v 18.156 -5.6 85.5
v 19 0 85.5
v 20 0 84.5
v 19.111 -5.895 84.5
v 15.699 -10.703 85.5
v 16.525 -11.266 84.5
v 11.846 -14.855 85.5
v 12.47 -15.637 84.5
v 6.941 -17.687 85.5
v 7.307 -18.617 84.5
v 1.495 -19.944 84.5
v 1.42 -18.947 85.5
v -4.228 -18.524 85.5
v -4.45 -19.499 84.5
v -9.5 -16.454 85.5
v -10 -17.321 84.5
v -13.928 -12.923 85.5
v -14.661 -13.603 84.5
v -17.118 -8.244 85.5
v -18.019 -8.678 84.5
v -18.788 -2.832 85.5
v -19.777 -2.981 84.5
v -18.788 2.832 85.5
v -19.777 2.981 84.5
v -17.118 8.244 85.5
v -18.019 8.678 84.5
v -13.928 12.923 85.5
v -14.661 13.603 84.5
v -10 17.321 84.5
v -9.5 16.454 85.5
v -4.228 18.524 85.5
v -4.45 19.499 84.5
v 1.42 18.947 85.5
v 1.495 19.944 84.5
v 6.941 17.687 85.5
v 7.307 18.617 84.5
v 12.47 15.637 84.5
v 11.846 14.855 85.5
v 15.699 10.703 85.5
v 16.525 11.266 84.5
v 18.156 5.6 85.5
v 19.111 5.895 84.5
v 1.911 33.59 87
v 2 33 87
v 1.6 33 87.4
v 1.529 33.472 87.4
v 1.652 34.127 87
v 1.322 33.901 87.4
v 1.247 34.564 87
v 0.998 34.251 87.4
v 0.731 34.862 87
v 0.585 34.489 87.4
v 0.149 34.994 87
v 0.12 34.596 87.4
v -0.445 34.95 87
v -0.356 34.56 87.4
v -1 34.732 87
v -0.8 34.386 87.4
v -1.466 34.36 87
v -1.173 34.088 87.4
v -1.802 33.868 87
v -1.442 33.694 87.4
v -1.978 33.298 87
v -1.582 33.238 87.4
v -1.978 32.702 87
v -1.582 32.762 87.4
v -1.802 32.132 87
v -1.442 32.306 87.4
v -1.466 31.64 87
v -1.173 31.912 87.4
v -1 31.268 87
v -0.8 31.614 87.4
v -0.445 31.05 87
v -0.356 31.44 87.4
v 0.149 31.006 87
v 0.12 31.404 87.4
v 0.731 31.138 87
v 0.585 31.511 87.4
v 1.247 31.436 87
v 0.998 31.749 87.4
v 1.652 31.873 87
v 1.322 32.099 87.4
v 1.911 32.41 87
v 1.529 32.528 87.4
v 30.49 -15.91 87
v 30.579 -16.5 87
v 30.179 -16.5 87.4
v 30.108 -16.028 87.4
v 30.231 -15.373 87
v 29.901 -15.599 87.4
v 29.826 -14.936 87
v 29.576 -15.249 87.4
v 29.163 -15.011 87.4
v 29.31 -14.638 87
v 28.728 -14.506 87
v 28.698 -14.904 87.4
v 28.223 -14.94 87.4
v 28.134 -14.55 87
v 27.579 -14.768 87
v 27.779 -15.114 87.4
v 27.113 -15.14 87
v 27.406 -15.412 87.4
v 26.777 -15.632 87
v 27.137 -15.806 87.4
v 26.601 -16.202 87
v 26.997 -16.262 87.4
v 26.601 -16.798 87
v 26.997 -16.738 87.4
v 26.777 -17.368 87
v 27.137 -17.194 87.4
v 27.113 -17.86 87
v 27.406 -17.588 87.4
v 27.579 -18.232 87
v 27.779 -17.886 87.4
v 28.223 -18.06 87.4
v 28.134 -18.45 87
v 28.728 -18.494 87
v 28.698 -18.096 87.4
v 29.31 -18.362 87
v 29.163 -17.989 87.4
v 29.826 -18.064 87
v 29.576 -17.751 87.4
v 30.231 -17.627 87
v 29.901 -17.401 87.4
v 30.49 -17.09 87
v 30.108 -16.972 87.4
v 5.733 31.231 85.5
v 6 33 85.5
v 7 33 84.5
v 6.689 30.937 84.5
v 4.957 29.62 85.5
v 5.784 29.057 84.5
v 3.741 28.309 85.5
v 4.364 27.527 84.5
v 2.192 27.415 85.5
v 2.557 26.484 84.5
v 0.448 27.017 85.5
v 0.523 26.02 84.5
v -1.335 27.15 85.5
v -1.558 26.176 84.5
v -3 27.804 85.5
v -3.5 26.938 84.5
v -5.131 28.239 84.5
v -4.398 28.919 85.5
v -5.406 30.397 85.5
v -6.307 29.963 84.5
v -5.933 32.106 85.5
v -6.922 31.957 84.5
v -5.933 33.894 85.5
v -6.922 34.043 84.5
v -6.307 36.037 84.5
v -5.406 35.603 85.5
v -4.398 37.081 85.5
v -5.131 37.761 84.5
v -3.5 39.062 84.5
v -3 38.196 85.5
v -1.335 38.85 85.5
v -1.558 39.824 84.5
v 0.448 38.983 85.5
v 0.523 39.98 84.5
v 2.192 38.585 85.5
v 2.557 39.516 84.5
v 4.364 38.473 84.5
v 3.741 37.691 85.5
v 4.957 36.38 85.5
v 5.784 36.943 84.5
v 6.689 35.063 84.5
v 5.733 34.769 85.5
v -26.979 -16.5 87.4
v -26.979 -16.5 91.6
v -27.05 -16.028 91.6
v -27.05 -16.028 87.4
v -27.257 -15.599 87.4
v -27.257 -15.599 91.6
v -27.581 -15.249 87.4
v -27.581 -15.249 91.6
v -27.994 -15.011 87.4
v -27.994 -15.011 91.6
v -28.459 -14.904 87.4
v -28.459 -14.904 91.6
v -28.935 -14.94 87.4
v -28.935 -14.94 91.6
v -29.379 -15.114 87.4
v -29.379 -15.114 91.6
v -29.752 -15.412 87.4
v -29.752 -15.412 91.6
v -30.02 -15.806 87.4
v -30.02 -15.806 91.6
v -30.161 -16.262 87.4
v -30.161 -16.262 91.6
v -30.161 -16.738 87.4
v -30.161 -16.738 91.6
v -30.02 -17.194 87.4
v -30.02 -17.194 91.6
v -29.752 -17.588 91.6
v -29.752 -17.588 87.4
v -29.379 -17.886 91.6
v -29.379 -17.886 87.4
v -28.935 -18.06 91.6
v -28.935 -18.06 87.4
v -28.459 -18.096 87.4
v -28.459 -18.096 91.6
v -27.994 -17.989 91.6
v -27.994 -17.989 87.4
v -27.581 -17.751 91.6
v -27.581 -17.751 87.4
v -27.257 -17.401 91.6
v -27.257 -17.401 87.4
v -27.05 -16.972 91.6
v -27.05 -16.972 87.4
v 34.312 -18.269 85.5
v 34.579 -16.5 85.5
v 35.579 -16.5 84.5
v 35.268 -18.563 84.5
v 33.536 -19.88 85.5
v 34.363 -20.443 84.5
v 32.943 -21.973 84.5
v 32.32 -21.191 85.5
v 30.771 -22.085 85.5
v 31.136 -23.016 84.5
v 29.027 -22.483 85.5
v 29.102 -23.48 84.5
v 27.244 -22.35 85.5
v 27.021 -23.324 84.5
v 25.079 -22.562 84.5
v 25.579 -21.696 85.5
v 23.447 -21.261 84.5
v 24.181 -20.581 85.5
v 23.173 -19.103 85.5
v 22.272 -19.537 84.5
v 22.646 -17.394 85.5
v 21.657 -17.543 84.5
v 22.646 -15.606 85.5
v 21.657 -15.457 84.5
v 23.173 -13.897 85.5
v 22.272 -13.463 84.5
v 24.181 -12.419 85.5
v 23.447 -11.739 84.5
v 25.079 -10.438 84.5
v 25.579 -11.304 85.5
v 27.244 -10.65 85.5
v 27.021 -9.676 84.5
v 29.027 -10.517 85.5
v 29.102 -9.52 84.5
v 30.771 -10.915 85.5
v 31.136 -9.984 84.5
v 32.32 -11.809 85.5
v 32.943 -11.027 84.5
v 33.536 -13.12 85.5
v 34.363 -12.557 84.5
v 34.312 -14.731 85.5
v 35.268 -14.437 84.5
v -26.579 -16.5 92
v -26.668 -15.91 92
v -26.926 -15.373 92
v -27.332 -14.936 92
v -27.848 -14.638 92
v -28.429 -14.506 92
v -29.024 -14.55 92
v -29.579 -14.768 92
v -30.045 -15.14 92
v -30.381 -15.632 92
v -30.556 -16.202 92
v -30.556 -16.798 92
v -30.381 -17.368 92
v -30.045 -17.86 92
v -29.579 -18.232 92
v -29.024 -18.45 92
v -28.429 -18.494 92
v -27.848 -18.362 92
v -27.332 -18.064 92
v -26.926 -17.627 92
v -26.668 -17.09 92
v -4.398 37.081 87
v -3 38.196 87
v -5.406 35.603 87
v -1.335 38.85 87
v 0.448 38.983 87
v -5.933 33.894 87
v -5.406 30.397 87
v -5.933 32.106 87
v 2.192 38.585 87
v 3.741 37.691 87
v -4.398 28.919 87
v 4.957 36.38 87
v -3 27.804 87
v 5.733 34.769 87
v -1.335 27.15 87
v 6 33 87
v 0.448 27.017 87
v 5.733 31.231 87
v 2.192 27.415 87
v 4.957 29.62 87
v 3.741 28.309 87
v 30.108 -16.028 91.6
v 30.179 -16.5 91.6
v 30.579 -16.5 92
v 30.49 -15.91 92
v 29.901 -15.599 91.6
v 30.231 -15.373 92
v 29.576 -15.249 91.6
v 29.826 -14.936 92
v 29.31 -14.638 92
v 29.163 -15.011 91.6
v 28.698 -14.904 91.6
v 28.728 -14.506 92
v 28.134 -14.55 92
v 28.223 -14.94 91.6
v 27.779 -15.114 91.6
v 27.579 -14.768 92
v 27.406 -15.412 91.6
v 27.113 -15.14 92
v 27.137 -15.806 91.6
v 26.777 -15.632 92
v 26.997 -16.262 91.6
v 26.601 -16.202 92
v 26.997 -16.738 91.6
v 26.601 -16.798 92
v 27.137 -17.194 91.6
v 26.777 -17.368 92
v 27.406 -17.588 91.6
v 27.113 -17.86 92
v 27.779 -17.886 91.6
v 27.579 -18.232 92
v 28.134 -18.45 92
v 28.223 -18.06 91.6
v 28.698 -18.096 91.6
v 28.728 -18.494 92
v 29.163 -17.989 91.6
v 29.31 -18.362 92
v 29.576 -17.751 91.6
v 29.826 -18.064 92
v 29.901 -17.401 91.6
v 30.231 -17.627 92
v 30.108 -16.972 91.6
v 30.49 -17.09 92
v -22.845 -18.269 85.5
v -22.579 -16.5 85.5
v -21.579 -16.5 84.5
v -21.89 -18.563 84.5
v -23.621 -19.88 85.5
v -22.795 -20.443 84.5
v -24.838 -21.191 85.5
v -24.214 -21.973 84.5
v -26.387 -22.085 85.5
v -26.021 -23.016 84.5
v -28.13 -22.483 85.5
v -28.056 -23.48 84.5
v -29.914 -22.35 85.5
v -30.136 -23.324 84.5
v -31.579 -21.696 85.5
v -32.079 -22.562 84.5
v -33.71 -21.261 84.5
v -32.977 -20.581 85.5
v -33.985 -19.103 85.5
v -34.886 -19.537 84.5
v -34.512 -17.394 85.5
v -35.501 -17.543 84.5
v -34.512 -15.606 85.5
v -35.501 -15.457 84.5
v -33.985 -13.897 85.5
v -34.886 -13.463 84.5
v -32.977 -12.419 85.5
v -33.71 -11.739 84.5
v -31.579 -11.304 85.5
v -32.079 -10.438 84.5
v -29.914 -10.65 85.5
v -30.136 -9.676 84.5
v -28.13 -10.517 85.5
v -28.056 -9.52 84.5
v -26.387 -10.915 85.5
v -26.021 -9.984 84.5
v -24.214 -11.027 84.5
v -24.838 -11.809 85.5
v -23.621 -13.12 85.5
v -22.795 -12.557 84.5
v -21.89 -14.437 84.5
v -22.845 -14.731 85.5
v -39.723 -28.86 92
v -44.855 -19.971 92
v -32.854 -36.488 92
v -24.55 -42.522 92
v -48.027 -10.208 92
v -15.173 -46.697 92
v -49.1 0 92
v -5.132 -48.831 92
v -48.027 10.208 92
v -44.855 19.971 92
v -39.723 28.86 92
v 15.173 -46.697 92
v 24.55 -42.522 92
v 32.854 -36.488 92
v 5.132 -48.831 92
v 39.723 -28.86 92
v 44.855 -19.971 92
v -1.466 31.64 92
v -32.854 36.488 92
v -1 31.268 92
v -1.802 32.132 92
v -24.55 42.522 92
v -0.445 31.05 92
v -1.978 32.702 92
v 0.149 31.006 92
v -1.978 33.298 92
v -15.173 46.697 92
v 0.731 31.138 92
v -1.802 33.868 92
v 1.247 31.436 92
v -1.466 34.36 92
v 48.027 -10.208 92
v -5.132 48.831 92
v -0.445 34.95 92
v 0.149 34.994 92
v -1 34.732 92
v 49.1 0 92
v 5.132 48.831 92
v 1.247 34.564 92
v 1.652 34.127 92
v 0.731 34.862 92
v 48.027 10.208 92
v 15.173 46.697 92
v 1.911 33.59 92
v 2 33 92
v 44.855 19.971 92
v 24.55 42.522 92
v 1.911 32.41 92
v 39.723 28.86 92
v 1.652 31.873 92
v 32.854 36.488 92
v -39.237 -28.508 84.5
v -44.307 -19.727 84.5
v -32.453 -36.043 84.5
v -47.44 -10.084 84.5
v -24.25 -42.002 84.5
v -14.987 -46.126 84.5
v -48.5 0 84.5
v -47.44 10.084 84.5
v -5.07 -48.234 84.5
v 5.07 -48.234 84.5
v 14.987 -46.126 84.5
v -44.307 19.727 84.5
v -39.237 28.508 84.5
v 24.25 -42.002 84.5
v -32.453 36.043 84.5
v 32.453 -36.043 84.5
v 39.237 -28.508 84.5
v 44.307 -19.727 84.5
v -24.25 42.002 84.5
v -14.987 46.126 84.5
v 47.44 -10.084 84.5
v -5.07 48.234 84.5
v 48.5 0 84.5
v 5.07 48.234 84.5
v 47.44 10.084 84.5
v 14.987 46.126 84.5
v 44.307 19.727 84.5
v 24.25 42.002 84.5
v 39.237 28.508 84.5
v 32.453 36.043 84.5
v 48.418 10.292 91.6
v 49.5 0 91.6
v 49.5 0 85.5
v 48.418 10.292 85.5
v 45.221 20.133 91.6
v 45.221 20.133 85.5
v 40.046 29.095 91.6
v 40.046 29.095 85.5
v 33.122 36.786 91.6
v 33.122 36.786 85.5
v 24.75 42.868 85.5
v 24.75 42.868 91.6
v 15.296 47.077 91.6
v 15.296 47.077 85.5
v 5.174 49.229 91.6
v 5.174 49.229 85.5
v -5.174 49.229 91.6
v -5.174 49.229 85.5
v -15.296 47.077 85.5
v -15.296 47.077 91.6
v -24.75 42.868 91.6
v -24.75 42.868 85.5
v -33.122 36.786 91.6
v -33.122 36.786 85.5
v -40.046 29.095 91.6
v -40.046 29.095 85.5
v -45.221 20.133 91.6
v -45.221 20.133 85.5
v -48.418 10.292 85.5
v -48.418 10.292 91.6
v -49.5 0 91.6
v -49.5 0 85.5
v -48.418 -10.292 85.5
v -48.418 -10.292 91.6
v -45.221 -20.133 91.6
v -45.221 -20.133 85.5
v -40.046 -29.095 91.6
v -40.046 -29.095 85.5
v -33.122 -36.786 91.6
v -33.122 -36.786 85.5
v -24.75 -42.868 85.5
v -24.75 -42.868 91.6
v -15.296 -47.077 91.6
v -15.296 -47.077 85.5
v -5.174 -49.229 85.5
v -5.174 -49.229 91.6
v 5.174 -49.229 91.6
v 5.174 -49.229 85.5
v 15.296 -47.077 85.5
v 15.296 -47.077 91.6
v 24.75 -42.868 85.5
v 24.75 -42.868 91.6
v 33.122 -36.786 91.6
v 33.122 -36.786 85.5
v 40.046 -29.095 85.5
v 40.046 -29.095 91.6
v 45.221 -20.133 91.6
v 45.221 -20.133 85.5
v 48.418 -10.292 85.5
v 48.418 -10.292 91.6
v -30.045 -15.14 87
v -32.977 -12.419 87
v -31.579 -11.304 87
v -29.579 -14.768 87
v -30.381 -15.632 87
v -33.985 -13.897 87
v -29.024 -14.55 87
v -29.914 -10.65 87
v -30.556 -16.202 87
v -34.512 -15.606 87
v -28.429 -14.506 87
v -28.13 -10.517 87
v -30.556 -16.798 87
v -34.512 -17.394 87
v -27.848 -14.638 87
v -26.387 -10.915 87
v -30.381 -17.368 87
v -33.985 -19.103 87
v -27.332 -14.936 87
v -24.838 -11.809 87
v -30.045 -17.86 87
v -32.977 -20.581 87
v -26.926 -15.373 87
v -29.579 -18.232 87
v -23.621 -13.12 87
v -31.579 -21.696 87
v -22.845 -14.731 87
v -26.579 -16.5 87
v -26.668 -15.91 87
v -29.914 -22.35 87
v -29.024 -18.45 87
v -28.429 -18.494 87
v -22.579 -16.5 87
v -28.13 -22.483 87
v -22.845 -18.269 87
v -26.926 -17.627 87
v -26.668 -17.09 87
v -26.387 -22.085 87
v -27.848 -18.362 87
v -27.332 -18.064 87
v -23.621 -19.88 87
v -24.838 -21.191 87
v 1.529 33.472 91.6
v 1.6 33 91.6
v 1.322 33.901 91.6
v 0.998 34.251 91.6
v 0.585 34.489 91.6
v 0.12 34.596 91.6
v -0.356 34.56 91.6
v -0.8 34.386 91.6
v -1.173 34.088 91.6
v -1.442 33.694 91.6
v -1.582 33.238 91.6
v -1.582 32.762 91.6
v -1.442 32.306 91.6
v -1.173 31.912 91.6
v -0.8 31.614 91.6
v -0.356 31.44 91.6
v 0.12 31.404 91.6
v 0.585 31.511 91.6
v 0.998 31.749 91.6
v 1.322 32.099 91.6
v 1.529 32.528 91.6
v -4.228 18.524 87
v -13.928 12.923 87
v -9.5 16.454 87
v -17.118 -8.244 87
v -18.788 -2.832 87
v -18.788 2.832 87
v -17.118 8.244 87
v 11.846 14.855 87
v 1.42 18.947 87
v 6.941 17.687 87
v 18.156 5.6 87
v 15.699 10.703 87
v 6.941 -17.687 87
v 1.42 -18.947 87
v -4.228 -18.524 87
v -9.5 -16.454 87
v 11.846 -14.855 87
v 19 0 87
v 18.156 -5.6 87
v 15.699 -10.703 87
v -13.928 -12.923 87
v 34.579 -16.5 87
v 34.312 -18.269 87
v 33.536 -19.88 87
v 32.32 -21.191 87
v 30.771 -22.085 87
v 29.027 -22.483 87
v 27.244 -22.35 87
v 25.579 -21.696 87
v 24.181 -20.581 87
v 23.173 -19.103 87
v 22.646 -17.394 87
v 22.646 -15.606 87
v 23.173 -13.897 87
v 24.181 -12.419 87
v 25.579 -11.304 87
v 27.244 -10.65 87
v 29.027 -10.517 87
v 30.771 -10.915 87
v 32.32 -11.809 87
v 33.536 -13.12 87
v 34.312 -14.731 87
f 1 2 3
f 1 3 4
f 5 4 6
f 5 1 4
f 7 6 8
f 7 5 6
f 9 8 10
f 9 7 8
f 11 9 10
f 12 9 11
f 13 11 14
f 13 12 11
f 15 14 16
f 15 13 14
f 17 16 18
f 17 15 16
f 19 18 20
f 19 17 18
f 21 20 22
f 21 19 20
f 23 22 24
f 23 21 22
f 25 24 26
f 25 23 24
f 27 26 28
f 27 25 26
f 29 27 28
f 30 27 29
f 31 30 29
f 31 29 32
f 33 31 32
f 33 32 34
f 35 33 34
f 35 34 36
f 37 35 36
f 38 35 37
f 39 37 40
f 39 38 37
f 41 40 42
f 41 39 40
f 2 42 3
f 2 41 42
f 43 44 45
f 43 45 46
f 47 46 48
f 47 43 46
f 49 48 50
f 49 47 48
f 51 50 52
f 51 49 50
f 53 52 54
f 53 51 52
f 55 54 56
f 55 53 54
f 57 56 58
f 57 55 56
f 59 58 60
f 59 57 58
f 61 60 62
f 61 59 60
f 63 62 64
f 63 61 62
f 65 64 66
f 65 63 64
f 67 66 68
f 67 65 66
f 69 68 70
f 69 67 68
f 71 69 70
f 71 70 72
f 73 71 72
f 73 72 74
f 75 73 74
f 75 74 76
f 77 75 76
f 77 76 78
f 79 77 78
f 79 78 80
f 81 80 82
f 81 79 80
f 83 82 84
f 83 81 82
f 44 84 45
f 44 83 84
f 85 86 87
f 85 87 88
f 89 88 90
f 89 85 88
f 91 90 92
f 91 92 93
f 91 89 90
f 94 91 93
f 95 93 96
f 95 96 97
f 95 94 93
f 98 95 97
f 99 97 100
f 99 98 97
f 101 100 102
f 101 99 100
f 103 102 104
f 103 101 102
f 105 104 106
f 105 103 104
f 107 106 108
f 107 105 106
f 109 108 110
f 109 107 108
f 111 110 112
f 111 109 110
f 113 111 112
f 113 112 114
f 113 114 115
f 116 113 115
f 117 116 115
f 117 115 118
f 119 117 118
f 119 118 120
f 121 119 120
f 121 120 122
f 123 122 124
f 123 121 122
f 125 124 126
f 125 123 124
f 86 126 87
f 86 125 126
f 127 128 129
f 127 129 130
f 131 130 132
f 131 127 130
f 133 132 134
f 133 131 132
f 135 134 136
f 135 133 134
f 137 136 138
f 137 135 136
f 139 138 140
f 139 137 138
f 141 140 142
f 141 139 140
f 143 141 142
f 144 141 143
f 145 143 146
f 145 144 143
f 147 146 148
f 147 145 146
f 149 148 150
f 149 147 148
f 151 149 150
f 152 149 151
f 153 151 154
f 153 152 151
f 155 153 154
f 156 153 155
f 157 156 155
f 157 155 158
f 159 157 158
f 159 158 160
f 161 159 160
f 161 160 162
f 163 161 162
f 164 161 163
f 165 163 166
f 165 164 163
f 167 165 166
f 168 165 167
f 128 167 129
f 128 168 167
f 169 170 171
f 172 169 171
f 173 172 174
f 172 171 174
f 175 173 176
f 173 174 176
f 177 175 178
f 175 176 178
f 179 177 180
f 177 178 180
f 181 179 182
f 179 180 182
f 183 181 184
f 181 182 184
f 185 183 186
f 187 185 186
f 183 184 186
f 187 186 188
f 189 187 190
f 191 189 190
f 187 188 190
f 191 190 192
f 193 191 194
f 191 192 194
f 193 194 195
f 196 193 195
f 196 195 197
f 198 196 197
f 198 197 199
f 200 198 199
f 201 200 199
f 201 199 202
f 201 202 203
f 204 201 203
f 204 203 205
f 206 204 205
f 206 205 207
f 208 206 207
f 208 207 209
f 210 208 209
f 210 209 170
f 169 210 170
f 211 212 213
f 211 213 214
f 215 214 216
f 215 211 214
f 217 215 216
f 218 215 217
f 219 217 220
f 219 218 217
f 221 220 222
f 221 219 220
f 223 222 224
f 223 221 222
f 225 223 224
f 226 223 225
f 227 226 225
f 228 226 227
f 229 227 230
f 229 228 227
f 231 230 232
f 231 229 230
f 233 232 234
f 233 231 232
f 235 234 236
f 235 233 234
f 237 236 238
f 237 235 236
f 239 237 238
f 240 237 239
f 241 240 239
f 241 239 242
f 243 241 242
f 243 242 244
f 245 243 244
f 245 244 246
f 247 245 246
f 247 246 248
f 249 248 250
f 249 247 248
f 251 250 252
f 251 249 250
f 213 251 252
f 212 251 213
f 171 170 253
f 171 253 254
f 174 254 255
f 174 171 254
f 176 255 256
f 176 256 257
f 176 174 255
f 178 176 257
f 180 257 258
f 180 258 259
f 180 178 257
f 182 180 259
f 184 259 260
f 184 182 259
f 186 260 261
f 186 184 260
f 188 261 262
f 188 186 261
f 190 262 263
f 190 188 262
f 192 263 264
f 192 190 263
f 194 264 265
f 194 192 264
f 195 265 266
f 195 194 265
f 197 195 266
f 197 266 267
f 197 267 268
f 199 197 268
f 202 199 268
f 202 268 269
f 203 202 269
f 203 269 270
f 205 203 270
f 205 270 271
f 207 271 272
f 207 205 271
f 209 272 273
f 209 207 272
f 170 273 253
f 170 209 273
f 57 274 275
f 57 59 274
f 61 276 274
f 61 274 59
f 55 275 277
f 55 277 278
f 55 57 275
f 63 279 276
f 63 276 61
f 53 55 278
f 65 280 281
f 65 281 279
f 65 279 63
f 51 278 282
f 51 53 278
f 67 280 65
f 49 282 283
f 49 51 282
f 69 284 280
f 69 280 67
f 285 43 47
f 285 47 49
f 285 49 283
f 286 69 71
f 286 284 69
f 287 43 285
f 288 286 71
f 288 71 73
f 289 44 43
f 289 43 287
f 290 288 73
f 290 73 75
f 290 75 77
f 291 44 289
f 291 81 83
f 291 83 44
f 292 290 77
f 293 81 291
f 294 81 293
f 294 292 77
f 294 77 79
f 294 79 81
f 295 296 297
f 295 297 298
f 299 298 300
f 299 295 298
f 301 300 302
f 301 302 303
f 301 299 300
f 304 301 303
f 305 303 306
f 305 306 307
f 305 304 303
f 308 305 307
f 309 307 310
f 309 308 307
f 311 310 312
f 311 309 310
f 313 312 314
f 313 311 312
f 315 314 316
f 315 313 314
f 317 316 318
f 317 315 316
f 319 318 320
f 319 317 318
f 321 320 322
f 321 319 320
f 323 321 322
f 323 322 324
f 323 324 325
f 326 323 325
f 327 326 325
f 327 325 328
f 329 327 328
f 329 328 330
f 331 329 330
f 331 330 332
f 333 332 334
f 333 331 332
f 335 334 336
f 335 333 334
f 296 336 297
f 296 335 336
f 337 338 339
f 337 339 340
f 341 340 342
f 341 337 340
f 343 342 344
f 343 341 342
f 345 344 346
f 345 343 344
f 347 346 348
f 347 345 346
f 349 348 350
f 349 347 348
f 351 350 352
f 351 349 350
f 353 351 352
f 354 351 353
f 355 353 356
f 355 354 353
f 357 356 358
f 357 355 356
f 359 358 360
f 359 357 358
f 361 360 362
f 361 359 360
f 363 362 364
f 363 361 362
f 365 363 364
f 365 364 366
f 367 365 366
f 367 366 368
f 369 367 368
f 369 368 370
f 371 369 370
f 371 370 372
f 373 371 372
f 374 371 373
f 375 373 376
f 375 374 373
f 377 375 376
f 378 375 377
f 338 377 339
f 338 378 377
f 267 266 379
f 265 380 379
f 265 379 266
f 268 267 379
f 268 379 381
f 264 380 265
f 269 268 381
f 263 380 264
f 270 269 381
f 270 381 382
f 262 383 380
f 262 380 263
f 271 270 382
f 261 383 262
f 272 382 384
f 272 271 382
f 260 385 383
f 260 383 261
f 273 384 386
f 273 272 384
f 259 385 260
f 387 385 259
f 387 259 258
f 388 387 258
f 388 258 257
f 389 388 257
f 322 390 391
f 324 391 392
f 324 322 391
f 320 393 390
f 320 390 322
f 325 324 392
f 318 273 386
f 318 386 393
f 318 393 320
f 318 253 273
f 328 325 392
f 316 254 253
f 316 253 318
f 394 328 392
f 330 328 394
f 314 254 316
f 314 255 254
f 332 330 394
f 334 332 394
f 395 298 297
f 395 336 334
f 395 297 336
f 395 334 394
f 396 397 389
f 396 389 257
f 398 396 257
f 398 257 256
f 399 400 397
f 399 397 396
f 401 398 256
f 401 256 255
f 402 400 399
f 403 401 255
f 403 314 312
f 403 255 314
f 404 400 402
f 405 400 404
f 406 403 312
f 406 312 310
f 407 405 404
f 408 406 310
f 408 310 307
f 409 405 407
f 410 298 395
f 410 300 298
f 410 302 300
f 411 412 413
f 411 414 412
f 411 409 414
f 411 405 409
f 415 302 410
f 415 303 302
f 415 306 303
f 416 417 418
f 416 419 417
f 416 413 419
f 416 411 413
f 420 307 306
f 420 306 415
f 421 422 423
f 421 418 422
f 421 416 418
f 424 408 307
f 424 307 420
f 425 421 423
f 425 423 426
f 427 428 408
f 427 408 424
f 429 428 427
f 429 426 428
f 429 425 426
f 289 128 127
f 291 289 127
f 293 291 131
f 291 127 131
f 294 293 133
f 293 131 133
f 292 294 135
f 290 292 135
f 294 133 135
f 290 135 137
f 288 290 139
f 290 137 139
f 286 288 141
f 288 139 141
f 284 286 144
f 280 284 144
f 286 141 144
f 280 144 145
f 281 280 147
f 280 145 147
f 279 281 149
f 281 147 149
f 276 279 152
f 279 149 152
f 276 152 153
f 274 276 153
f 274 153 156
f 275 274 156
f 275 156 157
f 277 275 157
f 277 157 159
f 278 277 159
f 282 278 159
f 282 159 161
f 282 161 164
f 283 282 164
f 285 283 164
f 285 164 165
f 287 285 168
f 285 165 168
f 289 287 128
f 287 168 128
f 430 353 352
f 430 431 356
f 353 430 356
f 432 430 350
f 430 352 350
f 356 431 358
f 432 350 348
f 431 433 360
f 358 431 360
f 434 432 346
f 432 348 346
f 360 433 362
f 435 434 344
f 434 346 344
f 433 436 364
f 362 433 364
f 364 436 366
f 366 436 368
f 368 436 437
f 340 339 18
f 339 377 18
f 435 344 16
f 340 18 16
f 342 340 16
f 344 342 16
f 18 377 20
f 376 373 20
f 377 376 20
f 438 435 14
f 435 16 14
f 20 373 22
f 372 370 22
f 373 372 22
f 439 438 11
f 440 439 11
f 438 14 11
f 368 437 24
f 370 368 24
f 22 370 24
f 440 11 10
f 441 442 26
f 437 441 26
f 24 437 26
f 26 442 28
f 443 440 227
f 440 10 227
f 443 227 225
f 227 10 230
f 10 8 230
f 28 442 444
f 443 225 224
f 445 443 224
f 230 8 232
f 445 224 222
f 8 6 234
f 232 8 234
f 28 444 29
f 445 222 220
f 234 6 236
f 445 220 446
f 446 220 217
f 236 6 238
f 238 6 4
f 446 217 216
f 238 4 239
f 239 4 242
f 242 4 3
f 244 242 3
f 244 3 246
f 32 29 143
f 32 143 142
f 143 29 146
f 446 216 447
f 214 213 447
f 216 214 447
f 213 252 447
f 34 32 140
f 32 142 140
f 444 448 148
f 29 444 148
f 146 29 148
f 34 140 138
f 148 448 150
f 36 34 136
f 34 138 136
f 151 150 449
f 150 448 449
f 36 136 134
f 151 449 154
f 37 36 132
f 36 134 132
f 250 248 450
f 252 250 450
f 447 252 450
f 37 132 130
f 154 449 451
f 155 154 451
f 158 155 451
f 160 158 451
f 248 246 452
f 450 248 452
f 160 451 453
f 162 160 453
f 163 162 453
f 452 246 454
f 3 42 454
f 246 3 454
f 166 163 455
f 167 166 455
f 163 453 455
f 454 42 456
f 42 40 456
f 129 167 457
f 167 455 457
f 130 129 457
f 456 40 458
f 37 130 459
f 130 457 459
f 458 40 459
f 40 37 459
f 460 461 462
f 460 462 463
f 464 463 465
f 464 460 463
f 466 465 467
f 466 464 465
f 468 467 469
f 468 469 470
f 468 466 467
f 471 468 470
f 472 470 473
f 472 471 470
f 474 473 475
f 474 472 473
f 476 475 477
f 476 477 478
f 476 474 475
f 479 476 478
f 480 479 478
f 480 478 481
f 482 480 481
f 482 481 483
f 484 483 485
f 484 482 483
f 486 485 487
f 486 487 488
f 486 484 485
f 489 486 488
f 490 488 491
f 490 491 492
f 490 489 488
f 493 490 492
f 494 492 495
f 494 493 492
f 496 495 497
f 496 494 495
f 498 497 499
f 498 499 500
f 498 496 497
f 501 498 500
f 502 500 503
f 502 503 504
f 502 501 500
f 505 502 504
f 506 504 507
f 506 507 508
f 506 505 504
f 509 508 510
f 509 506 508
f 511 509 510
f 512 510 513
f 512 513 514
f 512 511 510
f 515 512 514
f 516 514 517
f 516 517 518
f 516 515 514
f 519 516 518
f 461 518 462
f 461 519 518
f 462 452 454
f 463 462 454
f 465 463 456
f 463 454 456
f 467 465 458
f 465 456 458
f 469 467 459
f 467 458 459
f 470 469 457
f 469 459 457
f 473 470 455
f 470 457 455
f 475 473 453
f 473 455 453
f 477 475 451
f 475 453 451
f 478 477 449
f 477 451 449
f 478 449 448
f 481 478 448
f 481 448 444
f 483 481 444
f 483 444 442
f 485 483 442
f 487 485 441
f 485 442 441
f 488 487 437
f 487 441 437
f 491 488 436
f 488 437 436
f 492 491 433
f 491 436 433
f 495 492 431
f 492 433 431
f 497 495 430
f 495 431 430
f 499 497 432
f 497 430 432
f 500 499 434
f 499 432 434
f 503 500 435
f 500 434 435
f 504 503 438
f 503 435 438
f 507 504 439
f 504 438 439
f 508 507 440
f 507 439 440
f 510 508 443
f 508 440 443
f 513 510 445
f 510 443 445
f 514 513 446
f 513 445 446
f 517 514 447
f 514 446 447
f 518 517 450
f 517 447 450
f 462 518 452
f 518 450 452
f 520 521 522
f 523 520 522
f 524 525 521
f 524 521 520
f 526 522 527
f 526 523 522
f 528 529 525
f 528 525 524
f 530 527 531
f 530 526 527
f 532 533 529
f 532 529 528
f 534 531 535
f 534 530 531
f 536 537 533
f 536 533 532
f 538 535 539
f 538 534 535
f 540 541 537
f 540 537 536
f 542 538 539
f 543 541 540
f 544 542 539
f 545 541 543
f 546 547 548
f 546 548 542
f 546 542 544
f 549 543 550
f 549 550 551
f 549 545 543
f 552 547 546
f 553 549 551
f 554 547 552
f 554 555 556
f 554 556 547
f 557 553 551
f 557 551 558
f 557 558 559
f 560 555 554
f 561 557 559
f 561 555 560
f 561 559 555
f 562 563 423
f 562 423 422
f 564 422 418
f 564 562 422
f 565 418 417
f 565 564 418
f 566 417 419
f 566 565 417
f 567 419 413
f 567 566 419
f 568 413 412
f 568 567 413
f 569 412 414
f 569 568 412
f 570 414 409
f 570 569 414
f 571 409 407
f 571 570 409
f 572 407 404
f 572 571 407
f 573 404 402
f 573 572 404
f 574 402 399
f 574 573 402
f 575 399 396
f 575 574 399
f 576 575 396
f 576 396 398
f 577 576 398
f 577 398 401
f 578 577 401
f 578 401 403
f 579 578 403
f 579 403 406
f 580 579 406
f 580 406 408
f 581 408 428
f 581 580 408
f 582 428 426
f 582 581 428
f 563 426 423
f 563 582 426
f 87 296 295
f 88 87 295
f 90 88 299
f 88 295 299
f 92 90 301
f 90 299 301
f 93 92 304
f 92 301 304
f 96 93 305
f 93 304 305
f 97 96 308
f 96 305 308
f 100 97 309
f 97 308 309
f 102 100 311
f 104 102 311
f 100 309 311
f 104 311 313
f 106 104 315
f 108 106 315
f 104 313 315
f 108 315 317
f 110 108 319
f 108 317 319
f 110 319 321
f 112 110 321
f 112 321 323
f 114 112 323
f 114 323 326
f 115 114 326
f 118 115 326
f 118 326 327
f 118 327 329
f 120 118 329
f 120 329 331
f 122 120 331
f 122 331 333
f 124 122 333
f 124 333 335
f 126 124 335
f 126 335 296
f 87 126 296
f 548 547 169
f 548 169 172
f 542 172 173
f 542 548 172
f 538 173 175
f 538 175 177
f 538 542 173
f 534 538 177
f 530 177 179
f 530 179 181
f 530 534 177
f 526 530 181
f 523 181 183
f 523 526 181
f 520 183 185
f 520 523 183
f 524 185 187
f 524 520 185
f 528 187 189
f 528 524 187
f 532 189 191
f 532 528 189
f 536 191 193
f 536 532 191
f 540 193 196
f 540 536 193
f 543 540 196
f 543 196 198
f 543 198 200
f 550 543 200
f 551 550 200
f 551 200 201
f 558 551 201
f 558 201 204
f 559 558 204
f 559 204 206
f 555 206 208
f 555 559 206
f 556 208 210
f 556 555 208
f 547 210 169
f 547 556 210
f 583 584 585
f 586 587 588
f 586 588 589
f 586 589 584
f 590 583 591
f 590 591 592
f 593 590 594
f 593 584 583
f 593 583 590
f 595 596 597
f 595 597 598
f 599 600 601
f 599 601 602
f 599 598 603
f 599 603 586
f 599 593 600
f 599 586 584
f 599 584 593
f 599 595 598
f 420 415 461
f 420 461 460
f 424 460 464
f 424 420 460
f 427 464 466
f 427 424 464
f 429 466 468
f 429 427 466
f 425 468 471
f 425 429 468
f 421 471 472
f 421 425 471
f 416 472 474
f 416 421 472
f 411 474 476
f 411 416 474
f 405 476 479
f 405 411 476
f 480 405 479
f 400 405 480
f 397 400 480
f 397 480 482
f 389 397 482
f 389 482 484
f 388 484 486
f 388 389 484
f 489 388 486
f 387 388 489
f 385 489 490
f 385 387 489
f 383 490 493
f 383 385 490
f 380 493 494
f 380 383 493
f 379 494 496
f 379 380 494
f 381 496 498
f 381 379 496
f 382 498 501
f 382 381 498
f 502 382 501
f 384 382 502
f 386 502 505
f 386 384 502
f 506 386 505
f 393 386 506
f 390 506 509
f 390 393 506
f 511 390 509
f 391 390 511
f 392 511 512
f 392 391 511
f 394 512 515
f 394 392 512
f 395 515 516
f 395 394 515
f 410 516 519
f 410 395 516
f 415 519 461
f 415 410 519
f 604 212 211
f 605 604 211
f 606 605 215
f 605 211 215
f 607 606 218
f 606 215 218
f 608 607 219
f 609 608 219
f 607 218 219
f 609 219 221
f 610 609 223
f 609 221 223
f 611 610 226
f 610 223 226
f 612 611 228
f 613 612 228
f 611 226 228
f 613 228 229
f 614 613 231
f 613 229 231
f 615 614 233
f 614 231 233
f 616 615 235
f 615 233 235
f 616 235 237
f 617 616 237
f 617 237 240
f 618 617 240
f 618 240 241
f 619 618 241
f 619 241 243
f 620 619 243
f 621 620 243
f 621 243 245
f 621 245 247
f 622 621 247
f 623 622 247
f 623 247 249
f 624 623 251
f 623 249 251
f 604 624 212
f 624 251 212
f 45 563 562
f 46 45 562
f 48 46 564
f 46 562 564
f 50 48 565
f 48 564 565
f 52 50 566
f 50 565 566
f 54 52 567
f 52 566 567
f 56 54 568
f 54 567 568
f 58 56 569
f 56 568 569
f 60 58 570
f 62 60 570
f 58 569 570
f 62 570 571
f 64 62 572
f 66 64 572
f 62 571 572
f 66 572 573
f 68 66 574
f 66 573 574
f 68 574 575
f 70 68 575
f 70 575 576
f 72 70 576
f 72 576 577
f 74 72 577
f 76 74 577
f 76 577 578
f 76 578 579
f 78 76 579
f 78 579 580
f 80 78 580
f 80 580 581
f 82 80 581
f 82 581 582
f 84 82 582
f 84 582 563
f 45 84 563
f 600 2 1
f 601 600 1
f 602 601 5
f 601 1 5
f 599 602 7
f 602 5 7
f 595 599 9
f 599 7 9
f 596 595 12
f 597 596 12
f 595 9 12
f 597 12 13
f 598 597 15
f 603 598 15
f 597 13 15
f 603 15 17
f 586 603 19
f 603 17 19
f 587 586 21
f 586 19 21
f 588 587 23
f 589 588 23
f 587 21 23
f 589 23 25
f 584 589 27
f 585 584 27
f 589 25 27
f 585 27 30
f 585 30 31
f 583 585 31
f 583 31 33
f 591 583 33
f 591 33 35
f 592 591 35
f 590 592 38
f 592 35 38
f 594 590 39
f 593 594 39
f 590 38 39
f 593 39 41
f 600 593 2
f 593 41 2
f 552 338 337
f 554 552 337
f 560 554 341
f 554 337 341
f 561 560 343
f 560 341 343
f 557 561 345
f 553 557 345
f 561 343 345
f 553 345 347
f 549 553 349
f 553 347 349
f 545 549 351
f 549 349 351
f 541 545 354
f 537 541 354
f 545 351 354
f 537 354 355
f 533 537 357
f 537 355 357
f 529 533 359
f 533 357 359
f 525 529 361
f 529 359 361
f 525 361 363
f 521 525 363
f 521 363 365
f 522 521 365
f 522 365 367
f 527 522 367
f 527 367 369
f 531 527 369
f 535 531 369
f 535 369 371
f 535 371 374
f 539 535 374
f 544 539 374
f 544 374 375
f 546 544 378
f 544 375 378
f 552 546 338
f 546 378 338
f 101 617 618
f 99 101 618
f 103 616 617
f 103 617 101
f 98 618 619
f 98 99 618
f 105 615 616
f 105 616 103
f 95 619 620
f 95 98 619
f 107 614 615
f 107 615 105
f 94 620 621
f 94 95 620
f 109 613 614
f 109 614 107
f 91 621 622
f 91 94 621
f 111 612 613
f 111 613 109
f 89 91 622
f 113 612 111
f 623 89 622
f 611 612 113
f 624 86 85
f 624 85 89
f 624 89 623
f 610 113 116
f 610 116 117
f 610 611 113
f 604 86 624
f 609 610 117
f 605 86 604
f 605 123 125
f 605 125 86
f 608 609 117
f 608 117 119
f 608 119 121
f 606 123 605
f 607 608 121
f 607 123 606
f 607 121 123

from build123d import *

# Parameters (mm, degrees)
SKETCH075_R     = 49.5
SKETCH075_R_2   = 1.6
PAD039_DEPTH    = 7.5
SKETCH076_R     = 19
SKETCH076_R_2   = 6
POCKET036_DEPTH = 2.5
CHAMFER012_SIZE = 1
CHAMFER013_SIZE = 0.4


with BuildPart() as part:
    # Sketch075 → Pad039 (new body)
    with BuildSketch(Plane.XY):
        Circle(SKETCH075_R)
        with Locations((0, 33)):
            Circle(SKETCH075_R_2, mode=Mode.SUBTRACT)
        with Locations((28.578838, -16.5)):
            Circle(SKETCH075_R_2, mode=Mode.SUBTRACT)
        with Locations((-28.578838, -16.5)):
            Circle(SKETCH075_R_2, mode=Mode.SUBTRACT)
    extrude(amount=-PAD039_DEPTH)

    # Sketch076 (on Face6 of Pad039) → Pocket036 (cut)
    with BuildSketch(Plane(origin=(0, 0, -7.5), x_dir=(1, 0, 0), z_dir=(0, 0, -1))):
        Circle(SKETCH076_R)
        with Locations((28.578838, 16.5)):
            Circle(SKETCH076_R_2)
        with Locations((0, -33)):
            Circle(SKETCH076_R_2)
        with Locations((-28.578838, 16.5)):
            Circle(SKETCH076_R_2)
    extrude(amount=-POCKET036_DEPTH, mode=Mode.SUBTRACT)

    # Chamfer012
    chamfer012_edges = [part.edges().sort_by_distance(p)[0] for p in [
        (-19, 0, -7.5),
        (22.578838, -16.5, -7.5),
        (-34.578838, -16.5, -7.5),
        (-6, 33, -7.5),
        (-49.5, 0, -7.5),
    ]]
    chamfer(chamfer012_edges, length=CHAMFER012_SIZE)

    # Chamfer013
    chamfer013_edges = [part.edges().sort_by_distance(p)[0] for p in [
        (26.978838, -16.5, -5),
        (-1.6, 33, -5),
        (-1.6, 33, 0),
        (26.978838, -16.5, 0),
        (-30.178838, -16.5, -5),
        (-30.178838, -16.5, 0),
        (-49.5, 0, 0),
    ]]
    chamfer(chamfer013_edges, length=CHAMFER013_SIZE)


with BuildPart() as part_1:
    # Body033 placement: moved
    add(part.part.moved(Location((0, 0, 92))))


solid = part_1.part
